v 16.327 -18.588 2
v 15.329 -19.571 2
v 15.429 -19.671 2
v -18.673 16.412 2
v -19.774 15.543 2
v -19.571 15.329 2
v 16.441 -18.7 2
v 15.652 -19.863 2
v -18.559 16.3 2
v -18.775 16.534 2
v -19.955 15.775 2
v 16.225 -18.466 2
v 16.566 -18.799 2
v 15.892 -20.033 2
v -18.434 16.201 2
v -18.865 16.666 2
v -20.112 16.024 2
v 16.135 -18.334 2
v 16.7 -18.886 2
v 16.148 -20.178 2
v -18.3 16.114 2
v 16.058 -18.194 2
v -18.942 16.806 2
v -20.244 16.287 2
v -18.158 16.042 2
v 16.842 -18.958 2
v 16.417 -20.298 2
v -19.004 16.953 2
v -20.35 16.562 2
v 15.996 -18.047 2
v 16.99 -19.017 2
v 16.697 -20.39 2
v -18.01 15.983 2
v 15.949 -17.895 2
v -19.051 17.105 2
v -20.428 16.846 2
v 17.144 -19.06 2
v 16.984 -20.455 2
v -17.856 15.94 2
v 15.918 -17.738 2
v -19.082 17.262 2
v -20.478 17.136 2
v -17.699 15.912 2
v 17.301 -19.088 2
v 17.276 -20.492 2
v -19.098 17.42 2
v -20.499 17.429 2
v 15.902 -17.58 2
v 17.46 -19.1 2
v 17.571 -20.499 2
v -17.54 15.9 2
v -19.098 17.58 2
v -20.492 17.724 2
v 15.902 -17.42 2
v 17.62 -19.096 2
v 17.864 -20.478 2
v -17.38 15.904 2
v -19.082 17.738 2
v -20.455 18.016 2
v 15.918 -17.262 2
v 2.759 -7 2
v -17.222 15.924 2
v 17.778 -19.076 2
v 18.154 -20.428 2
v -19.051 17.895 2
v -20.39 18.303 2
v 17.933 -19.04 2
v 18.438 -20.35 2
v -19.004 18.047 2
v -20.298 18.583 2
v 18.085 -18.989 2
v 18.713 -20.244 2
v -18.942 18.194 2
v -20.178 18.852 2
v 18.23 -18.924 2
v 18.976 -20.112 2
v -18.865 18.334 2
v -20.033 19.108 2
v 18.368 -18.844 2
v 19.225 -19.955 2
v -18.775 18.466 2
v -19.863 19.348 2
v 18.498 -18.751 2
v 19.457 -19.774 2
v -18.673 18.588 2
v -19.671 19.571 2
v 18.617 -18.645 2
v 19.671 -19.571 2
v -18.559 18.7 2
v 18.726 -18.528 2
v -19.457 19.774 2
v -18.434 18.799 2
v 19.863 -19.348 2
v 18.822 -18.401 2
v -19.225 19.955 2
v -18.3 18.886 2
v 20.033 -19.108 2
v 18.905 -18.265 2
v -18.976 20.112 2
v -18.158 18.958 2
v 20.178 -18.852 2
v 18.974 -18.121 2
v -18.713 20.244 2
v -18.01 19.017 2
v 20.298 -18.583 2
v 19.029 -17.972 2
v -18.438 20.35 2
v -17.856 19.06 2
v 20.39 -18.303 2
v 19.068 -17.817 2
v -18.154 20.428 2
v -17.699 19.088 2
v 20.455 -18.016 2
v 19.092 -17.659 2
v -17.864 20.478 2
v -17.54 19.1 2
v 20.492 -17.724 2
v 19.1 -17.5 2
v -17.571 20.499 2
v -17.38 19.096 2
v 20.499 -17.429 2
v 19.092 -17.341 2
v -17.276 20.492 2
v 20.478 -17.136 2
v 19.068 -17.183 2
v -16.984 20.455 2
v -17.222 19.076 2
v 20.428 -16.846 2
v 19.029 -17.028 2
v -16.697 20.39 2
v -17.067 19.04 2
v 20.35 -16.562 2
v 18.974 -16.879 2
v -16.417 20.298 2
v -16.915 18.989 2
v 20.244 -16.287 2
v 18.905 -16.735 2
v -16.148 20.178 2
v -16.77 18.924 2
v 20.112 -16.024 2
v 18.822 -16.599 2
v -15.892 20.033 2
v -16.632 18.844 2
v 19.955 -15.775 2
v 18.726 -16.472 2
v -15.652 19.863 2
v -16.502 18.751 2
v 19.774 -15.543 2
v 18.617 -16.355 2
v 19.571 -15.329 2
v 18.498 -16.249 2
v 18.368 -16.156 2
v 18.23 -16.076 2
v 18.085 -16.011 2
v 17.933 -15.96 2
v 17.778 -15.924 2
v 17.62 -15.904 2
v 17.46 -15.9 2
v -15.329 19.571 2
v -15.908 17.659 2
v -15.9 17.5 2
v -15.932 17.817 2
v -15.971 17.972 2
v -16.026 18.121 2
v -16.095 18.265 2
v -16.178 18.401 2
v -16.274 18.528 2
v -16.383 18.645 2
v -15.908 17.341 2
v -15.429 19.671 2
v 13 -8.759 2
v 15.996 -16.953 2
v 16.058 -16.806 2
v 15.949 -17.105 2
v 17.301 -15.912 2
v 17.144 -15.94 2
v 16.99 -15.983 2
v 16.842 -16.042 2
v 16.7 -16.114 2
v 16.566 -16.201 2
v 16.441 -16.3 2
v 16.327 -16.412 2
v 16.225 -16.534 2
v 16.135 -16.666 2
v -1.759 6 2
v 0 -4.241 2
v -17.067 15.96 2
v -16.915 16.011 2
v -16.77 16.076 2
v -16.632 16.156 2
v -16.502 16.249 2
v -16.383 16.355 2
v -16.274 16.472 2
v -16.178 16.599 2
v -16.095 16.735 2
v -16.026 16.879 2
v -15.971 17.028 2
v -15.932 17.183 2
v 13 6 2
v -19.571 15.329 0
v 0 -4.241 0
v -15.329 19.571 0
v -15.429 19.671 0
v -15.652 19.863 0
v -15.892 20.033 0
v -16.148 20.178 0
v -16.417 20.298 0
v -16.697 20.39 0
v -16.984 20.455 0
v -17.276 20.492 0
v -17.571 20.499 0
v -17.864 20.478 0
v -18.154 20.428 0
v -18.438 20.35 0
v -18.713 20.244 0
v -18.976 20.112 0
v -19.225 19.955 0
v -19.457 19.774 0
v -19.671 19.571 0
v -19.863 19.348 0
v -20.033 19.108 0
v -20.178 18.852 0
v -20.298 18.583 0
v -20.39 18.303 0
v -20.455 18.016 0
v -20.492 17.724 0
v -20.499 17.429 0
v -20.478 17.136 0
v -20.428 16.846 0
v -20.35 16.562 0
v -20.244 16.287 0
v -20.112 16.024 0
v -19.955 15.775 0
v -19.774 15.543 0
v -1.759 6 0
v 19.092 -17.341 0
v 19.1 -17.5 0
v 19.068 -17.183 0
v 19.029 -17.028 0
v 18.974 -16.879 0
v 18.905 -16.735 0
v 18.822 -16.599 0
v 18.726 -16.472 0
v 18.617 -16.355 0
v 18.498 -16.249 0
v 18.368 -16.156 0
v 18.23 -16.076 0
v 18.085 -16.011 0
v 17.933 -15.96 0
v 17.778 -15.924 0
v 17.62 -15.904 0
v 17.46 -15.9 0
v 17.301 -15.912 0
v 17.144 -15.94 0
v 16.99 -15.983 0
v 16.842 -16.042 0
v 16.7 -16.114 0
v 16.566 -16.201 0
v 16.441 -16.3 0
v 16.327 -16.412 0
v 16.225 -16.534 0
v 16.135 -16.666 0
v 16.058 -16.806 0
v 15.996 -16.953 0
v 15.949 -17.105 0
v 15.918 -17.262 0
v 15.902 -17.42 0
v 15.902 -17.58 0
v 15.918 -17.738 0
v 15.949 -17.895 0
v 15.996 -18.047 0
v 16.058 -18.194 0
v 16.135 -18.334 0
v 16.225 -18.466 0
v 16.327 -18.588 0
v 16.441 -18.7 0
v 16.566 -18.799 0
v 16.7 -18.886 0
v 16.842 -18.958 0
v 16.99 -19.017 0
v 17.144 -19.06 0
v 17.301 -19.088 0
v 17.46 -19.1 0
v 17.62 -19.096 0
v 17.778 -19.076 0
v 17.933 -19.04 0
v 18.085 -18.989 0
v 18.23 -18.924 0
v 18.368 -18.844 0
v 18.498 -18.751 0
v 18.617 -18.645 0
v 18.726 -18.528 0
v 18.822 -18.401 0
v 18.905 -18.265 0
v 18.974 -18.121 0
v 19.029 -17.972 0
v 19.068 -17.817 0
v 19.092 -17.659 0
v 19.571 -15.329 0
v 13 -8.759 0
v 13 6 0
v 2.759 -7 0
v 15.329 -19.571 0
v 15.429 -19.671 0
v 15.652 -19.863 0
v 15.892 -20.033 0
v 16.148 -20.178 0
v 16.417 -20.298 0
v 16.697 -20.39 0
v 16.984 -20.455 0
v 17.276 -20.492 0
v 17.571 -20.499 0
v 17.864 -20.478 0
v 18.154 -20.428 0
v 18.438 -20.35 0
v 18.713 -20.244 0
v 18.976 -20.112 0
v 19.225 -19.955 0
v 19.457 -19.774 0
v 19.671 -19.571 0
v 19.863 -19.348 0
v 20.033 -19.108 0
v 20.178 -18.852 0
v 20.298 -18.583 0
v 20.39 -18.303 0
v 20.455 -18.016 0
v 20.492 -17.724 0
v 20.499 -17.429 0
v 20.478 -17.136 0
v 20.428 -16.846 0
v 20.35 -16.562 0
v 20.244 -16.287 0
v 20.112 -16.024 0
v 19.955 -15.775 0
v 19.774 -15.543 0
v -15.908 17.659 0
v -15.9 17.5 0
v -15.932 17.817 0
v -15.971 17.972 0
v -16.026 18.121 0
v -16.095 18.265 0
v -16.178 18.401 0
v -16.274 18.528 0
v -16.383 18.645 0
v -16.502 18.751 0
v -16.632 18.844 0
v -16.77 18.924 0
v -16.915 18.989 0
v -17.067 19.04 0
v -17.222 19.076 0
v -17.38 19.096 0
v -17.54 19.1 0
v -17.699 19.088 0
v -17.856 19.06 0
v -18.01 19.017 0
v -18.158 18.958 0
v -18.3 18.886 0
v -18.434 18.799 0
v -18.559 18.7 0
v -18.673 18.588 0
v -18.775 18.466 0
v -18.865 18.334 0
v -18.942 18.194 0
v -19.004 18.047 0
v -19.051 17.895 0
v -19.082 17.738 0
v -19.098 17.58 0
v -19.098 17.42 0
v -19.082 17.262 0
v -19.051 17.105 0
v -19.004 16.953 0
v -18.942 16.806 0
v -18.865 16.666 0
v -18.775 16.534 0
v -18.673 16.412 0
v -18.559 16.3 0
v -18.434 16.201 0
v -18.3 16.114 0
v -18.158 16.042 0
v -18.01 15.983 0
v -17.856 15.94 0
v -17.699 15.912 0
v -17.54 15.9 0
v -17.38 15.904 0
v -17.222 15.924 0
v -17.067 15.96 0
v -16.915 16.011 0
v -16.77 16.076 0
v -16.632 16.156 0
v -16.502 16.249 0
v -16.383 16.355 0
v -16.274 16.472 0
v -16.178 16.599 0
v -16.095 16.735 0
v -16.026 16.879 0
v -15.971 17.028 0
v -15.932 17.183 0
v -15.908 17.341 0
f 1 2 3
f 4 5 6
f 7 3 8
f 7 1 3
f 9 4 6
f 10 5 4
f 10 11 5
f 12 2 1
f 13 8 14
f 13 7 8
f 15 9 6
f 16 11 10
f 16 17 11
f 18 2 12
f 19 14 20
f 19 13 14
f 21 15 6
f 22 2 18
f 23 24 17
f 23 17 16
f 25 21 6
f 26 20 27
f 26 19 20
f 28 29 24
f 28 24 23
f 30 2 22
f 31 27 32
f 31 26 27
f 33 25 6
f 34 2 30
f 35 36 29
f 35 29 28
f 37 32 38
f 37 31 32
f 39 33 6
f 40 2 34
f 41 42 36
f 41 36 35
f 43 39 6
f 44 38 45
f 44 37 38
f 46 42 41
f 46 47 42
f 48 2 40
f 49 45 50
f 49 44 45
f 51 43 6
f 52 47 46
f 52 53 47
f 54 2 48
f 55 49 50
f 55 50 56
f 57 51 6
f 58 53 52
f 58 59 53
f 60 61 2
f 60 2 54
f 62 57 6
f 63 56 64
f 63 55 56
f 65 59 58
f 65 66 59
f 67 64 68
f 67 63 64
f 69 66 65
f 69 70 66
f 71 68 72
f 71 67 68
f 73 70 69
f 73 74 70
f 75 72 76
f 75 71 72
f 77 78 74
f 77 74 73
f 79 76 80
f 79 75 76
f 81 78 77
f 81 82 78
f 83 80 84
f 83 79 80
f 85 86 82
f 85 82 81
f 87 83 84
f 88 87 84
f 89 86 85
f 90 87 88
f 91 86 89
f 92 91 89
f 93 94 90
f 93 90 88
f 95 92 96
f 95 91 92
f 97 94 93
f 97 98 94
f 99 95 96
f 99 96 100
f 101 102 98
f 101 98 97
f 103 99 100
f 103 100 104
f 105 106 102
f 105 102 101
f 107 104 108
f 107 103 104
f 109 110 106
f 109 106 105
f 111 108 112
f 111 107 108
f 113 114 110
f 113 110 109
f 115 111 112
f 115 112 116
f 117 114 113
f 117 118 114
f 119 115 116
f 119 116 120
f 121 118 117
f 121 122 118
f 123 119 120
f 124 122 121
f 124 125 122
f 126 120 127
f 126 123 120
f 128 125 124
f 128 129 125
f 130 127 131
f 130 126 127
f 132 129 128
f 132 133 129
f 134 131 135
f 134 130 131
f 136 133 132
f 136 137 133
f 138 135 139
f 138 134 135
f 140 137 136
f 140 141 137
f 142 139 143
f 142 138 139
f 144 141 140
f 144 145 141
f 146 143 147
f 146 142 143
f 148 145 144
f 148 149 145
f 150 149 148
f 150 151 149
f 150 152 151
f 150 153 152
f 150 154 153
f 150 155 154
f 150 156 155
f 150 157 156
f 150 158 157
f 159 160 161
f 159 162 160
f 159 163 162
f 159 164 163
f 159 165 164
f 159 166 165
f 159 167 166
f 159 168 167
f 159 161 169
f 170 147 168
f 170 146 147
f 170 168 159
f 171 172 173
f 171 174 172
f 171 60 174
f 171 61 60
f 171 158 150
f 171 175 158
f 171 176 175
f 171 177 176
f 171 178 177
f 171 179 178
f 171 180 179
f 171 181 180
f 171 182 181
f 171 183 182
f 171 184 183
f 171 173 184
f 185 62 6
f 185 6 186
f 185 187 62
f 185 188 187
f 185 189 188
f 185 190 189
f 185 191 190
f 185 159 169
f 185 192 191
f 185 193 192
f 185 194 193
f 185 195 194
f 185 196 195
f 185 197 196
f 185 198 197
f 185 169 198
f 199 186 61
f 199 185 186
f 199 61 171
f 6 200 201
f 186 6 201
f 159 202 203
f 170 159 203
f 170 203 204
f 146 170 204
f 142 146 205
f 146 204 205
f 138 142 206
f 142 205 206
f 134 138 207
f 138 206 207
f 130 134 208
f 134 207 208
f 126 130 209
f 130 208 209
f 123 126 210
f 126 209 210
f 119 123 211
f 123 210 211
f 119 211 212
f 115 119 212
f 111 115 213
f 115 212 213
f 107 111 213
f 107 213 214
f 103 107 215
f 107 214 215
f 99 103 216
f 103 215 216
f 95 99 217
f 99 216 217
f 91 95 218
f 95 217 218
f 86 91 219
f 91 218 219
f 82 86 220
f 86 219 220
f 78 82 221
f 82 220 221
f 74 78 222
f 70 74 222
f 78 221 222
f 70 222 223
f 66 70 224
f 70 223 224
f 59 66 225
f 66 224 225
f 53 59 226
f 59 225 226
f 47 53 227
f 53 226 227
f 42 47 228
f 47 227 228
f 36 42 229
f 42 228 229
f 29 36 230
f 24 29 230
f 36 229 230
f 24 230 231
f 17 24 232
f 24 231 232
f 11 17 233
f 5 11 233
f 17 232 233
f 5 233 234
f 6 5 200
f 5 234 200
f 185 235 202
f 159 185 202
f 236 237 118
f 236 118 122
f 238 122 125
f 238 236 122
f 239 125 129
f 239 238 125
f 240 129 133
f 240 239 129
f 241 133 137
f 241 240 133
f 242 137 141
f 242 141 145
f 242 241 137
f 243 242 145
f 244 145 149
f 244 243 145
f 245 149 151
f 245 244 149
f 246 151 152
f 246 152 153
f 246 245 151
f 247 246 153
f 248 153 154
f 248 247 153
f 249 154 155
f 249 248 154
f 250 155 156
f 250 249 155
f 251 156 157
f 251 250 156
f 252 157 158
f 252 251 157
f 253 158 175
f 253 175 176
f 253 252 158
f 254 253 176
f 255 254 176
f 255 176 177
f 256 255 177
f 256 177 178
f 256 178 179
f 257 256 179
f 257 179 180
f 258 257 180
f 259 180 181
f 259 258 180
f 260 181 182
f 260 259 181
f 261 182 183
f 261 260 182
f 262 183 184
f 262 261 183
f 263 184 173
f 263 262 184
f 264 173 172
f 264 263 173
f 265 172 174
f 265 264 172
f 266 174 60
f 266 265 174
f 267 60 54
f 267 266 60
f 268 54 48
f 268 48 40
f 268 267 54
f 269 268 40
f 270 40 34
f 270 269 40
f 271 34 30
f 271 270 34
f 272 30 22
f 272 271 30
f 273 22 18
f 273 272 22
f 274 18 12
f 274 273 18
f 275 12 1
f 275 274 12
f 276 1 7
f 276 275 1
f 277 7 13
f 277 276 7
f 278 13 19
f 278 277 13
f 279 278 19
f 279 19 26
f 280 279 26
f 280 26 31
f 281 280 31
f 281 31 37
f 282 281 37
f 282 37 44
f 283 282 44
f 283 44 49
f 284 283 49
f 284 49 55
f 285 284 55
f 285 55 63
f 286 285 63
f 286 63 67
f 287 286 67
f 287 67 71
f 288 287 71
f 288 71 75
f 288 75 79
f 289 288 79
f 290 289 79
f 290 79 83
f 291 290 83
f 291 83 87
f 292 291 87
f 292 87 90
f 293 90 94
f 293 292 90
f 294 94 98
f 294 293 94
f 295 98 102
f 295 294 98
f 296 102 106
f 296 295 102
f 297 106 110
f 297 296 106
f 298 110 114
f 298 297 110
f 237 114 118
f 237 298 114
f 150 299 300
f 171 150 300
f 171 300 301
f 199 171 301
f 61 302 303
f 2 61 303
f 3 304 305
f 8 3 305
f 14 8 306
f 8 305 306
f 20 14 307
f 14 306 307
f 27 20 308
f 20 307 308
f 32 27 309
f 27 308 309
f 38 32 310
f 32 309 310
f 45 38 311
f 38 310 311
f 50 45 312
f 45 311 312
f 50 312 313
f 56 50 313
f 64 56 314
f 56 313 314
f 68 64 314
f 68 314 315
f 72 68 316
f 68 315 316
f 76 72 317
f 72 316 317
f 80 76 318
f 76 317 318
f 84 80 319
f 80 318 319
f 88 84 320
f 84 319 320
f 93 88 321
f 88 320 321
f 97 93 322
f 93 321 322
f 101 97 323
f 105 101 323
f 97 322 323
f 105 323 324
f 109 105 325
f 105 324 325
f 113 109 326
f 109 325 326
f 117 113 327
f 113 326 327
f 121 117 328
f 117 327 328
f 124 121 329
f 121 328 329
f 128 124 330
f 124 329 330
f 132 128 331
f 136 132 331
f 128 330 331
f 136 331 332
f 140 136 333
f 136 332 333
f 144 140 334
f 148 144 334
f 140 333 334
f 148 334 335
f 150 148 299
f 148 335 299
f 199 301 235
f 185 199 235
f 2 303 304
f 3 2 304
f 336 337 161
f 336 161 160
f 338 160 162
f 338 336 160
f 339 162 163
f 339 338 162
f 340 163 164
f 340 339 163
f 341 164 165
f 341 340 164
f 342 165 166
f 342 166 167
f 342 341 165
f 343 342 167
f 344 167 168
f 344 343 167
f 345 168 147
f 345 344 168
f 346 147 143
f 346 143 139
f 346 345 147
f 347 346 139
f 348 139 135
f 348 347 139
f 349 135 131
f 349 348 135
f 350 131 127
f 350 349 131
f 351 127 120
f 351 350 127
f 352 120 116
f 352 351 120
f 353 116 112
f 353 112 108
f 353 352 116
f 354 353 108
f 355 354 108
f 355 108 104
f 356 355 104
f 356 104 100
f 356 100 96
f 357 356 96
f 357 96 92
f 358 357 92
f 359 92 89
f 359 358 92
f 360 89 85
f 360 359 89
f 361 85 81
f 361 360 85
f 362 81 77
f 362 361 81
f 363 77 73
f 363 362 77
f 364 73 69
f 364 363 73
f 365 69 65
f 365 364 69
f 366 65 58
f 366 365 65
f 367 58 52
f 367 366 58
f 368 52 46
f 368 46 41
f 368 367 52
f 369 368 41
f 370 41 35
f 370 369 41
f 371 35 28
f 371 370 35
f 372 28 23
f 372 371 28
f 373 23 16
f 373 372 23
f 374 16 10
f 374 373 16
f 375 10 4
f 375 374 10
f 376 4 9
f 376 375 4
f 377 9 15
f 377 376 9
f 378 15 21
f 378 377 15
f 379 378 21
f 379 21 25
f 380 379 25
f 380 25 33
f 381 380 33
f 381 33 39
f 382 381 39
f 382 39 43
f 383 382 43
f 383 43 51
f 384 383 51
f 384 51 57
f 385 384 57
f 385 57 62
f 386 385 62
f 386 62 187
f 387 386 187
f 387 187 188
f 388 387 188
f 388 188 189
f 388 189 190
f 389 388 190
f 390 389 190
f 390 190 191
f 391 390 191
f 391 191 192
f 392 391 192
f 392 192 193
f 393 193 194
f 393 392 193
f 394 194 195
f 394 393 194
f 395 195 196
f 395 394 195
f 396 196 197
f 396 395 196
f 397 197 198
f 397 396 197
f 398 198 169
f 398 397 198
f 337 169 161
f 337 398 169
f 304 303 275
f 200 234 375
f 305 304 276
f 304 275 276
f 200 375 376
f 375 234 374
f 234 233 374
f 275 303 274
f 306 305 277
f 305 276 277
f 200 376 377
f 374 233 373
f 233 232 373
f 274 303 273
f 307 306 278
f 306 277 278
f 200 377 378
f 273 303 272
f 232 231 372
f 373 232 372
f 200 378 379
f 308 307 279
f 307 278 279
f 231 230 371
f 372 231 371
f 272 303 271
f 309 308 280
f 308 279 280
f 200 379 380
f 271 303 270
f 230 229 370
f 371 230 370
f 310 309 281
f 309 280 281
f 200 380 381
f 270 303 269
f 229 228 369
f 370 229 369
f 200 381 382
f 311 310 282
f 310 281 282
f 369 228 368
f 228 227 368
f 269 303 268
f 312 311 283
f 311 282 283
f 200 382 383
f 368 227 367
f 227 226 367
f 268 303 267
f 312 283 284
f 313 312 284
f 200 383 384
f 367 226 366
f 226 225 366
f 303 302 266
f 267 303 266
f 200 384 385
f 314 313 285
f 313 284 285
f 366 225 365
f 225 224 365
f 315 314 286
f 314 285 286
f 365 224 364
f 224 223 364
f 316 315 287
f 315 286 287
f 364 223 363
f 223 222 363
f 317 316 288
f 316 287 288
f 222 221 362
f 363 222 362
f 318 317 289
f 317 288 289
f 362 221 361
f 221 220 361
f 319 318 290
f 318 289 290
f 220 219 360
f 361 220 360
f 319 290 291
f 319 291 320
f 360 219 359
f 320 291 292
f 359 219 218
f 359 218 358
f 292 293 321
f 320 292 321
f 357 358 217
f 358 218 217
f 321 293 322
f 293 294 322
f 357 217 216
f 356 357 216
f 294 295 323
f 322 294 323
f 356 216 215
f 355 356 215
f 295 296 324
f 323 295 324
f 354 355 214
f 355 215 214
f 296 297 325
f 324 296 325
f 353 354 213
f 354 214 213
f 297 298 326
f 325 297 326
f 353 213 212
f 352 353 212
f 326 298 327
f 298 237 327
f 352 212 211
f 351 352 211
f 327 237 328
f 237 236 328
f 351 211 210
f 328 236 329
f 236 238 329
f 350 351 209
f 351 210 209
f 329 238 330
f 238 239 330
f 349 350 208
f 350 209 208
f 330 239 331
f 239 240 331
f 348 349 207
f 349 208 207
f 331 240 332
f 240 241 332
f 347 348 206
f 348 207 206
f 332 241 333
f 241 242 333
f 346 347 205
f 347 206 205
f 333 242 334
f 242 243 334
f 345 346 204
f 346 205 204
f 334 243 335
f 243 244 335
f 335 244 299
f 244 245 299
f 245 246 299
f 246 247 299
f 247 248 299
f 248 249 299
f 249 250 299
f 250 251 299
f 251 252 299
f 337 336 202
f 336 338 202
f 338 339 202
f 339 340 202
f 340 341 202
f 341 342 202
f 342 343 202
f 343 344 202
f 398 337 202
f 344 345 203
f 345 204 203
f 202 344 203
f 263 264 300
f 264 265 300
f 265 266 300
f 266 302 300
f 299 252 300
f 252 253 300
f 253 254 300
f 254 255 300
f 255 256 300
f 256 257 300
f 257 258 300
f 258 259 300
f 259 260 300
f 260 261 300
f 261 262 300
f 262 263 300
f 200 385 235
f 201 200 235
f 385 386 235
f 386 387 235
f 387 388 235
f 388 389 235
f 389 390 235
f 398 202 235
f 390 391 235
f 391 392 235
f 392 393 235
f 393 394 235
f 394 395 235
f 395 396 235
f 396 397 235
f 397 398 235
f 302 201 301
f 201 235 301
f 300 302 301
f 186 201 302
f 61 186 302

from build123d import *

# Parameters (mm, degrees)
SKETCH_1_R      = 1.6
EXTRUDE_1_DEPTH = 2


with BuildPart() as part:
    # Эскиз1 → Бобышка-Вытянуть1 (new body)
    with BuildSketch(Plane.XY):
        with BuildLine():
            Line((0, -4.241468847), (2.758531153, -7))
            Line((2.758531153, -7), (15.329410732, -19.570879578))
            Line((15.329410732, -19.570879578), (15.429120422, -19.670589268))
            ThreePointArc((15.429120422, -19.670589268), (19.670589268, -19.570879578), (19.570879578, -15.329410732))
            Line((19.570879578, -15.329410732), (13, -8.758531153))
            Line((13, -8.758531153), (13, 6))
            Line((13, 6), (-1.758531153, 6))
            Line((-1.758531153, 6), (-15.329410732, 19.570879578))
            Line((-15.329410732, 19.570879578), (-15.429120422, 19.670589268))
            ThreePointArc((-15.429120422, 19.670589268), (-19.670589268, 19.570879578), (-19.570879578, 15.329410732))
            Line((-19.570879578, 15.329410732), (0, -4.241468847))
        make_face()
        with Locations((17.5, -17.5)):
            Circle(SKETCH_1_R, mode=Mode.SUBTRACT)
        with Locations((-17.5, 17.5)):
            Circle(SKETCH_1_R, mode=Mode.SUBTRACT)
    extrude(amount=EXTRUDE_1_DEPTH)


solid = part.part
